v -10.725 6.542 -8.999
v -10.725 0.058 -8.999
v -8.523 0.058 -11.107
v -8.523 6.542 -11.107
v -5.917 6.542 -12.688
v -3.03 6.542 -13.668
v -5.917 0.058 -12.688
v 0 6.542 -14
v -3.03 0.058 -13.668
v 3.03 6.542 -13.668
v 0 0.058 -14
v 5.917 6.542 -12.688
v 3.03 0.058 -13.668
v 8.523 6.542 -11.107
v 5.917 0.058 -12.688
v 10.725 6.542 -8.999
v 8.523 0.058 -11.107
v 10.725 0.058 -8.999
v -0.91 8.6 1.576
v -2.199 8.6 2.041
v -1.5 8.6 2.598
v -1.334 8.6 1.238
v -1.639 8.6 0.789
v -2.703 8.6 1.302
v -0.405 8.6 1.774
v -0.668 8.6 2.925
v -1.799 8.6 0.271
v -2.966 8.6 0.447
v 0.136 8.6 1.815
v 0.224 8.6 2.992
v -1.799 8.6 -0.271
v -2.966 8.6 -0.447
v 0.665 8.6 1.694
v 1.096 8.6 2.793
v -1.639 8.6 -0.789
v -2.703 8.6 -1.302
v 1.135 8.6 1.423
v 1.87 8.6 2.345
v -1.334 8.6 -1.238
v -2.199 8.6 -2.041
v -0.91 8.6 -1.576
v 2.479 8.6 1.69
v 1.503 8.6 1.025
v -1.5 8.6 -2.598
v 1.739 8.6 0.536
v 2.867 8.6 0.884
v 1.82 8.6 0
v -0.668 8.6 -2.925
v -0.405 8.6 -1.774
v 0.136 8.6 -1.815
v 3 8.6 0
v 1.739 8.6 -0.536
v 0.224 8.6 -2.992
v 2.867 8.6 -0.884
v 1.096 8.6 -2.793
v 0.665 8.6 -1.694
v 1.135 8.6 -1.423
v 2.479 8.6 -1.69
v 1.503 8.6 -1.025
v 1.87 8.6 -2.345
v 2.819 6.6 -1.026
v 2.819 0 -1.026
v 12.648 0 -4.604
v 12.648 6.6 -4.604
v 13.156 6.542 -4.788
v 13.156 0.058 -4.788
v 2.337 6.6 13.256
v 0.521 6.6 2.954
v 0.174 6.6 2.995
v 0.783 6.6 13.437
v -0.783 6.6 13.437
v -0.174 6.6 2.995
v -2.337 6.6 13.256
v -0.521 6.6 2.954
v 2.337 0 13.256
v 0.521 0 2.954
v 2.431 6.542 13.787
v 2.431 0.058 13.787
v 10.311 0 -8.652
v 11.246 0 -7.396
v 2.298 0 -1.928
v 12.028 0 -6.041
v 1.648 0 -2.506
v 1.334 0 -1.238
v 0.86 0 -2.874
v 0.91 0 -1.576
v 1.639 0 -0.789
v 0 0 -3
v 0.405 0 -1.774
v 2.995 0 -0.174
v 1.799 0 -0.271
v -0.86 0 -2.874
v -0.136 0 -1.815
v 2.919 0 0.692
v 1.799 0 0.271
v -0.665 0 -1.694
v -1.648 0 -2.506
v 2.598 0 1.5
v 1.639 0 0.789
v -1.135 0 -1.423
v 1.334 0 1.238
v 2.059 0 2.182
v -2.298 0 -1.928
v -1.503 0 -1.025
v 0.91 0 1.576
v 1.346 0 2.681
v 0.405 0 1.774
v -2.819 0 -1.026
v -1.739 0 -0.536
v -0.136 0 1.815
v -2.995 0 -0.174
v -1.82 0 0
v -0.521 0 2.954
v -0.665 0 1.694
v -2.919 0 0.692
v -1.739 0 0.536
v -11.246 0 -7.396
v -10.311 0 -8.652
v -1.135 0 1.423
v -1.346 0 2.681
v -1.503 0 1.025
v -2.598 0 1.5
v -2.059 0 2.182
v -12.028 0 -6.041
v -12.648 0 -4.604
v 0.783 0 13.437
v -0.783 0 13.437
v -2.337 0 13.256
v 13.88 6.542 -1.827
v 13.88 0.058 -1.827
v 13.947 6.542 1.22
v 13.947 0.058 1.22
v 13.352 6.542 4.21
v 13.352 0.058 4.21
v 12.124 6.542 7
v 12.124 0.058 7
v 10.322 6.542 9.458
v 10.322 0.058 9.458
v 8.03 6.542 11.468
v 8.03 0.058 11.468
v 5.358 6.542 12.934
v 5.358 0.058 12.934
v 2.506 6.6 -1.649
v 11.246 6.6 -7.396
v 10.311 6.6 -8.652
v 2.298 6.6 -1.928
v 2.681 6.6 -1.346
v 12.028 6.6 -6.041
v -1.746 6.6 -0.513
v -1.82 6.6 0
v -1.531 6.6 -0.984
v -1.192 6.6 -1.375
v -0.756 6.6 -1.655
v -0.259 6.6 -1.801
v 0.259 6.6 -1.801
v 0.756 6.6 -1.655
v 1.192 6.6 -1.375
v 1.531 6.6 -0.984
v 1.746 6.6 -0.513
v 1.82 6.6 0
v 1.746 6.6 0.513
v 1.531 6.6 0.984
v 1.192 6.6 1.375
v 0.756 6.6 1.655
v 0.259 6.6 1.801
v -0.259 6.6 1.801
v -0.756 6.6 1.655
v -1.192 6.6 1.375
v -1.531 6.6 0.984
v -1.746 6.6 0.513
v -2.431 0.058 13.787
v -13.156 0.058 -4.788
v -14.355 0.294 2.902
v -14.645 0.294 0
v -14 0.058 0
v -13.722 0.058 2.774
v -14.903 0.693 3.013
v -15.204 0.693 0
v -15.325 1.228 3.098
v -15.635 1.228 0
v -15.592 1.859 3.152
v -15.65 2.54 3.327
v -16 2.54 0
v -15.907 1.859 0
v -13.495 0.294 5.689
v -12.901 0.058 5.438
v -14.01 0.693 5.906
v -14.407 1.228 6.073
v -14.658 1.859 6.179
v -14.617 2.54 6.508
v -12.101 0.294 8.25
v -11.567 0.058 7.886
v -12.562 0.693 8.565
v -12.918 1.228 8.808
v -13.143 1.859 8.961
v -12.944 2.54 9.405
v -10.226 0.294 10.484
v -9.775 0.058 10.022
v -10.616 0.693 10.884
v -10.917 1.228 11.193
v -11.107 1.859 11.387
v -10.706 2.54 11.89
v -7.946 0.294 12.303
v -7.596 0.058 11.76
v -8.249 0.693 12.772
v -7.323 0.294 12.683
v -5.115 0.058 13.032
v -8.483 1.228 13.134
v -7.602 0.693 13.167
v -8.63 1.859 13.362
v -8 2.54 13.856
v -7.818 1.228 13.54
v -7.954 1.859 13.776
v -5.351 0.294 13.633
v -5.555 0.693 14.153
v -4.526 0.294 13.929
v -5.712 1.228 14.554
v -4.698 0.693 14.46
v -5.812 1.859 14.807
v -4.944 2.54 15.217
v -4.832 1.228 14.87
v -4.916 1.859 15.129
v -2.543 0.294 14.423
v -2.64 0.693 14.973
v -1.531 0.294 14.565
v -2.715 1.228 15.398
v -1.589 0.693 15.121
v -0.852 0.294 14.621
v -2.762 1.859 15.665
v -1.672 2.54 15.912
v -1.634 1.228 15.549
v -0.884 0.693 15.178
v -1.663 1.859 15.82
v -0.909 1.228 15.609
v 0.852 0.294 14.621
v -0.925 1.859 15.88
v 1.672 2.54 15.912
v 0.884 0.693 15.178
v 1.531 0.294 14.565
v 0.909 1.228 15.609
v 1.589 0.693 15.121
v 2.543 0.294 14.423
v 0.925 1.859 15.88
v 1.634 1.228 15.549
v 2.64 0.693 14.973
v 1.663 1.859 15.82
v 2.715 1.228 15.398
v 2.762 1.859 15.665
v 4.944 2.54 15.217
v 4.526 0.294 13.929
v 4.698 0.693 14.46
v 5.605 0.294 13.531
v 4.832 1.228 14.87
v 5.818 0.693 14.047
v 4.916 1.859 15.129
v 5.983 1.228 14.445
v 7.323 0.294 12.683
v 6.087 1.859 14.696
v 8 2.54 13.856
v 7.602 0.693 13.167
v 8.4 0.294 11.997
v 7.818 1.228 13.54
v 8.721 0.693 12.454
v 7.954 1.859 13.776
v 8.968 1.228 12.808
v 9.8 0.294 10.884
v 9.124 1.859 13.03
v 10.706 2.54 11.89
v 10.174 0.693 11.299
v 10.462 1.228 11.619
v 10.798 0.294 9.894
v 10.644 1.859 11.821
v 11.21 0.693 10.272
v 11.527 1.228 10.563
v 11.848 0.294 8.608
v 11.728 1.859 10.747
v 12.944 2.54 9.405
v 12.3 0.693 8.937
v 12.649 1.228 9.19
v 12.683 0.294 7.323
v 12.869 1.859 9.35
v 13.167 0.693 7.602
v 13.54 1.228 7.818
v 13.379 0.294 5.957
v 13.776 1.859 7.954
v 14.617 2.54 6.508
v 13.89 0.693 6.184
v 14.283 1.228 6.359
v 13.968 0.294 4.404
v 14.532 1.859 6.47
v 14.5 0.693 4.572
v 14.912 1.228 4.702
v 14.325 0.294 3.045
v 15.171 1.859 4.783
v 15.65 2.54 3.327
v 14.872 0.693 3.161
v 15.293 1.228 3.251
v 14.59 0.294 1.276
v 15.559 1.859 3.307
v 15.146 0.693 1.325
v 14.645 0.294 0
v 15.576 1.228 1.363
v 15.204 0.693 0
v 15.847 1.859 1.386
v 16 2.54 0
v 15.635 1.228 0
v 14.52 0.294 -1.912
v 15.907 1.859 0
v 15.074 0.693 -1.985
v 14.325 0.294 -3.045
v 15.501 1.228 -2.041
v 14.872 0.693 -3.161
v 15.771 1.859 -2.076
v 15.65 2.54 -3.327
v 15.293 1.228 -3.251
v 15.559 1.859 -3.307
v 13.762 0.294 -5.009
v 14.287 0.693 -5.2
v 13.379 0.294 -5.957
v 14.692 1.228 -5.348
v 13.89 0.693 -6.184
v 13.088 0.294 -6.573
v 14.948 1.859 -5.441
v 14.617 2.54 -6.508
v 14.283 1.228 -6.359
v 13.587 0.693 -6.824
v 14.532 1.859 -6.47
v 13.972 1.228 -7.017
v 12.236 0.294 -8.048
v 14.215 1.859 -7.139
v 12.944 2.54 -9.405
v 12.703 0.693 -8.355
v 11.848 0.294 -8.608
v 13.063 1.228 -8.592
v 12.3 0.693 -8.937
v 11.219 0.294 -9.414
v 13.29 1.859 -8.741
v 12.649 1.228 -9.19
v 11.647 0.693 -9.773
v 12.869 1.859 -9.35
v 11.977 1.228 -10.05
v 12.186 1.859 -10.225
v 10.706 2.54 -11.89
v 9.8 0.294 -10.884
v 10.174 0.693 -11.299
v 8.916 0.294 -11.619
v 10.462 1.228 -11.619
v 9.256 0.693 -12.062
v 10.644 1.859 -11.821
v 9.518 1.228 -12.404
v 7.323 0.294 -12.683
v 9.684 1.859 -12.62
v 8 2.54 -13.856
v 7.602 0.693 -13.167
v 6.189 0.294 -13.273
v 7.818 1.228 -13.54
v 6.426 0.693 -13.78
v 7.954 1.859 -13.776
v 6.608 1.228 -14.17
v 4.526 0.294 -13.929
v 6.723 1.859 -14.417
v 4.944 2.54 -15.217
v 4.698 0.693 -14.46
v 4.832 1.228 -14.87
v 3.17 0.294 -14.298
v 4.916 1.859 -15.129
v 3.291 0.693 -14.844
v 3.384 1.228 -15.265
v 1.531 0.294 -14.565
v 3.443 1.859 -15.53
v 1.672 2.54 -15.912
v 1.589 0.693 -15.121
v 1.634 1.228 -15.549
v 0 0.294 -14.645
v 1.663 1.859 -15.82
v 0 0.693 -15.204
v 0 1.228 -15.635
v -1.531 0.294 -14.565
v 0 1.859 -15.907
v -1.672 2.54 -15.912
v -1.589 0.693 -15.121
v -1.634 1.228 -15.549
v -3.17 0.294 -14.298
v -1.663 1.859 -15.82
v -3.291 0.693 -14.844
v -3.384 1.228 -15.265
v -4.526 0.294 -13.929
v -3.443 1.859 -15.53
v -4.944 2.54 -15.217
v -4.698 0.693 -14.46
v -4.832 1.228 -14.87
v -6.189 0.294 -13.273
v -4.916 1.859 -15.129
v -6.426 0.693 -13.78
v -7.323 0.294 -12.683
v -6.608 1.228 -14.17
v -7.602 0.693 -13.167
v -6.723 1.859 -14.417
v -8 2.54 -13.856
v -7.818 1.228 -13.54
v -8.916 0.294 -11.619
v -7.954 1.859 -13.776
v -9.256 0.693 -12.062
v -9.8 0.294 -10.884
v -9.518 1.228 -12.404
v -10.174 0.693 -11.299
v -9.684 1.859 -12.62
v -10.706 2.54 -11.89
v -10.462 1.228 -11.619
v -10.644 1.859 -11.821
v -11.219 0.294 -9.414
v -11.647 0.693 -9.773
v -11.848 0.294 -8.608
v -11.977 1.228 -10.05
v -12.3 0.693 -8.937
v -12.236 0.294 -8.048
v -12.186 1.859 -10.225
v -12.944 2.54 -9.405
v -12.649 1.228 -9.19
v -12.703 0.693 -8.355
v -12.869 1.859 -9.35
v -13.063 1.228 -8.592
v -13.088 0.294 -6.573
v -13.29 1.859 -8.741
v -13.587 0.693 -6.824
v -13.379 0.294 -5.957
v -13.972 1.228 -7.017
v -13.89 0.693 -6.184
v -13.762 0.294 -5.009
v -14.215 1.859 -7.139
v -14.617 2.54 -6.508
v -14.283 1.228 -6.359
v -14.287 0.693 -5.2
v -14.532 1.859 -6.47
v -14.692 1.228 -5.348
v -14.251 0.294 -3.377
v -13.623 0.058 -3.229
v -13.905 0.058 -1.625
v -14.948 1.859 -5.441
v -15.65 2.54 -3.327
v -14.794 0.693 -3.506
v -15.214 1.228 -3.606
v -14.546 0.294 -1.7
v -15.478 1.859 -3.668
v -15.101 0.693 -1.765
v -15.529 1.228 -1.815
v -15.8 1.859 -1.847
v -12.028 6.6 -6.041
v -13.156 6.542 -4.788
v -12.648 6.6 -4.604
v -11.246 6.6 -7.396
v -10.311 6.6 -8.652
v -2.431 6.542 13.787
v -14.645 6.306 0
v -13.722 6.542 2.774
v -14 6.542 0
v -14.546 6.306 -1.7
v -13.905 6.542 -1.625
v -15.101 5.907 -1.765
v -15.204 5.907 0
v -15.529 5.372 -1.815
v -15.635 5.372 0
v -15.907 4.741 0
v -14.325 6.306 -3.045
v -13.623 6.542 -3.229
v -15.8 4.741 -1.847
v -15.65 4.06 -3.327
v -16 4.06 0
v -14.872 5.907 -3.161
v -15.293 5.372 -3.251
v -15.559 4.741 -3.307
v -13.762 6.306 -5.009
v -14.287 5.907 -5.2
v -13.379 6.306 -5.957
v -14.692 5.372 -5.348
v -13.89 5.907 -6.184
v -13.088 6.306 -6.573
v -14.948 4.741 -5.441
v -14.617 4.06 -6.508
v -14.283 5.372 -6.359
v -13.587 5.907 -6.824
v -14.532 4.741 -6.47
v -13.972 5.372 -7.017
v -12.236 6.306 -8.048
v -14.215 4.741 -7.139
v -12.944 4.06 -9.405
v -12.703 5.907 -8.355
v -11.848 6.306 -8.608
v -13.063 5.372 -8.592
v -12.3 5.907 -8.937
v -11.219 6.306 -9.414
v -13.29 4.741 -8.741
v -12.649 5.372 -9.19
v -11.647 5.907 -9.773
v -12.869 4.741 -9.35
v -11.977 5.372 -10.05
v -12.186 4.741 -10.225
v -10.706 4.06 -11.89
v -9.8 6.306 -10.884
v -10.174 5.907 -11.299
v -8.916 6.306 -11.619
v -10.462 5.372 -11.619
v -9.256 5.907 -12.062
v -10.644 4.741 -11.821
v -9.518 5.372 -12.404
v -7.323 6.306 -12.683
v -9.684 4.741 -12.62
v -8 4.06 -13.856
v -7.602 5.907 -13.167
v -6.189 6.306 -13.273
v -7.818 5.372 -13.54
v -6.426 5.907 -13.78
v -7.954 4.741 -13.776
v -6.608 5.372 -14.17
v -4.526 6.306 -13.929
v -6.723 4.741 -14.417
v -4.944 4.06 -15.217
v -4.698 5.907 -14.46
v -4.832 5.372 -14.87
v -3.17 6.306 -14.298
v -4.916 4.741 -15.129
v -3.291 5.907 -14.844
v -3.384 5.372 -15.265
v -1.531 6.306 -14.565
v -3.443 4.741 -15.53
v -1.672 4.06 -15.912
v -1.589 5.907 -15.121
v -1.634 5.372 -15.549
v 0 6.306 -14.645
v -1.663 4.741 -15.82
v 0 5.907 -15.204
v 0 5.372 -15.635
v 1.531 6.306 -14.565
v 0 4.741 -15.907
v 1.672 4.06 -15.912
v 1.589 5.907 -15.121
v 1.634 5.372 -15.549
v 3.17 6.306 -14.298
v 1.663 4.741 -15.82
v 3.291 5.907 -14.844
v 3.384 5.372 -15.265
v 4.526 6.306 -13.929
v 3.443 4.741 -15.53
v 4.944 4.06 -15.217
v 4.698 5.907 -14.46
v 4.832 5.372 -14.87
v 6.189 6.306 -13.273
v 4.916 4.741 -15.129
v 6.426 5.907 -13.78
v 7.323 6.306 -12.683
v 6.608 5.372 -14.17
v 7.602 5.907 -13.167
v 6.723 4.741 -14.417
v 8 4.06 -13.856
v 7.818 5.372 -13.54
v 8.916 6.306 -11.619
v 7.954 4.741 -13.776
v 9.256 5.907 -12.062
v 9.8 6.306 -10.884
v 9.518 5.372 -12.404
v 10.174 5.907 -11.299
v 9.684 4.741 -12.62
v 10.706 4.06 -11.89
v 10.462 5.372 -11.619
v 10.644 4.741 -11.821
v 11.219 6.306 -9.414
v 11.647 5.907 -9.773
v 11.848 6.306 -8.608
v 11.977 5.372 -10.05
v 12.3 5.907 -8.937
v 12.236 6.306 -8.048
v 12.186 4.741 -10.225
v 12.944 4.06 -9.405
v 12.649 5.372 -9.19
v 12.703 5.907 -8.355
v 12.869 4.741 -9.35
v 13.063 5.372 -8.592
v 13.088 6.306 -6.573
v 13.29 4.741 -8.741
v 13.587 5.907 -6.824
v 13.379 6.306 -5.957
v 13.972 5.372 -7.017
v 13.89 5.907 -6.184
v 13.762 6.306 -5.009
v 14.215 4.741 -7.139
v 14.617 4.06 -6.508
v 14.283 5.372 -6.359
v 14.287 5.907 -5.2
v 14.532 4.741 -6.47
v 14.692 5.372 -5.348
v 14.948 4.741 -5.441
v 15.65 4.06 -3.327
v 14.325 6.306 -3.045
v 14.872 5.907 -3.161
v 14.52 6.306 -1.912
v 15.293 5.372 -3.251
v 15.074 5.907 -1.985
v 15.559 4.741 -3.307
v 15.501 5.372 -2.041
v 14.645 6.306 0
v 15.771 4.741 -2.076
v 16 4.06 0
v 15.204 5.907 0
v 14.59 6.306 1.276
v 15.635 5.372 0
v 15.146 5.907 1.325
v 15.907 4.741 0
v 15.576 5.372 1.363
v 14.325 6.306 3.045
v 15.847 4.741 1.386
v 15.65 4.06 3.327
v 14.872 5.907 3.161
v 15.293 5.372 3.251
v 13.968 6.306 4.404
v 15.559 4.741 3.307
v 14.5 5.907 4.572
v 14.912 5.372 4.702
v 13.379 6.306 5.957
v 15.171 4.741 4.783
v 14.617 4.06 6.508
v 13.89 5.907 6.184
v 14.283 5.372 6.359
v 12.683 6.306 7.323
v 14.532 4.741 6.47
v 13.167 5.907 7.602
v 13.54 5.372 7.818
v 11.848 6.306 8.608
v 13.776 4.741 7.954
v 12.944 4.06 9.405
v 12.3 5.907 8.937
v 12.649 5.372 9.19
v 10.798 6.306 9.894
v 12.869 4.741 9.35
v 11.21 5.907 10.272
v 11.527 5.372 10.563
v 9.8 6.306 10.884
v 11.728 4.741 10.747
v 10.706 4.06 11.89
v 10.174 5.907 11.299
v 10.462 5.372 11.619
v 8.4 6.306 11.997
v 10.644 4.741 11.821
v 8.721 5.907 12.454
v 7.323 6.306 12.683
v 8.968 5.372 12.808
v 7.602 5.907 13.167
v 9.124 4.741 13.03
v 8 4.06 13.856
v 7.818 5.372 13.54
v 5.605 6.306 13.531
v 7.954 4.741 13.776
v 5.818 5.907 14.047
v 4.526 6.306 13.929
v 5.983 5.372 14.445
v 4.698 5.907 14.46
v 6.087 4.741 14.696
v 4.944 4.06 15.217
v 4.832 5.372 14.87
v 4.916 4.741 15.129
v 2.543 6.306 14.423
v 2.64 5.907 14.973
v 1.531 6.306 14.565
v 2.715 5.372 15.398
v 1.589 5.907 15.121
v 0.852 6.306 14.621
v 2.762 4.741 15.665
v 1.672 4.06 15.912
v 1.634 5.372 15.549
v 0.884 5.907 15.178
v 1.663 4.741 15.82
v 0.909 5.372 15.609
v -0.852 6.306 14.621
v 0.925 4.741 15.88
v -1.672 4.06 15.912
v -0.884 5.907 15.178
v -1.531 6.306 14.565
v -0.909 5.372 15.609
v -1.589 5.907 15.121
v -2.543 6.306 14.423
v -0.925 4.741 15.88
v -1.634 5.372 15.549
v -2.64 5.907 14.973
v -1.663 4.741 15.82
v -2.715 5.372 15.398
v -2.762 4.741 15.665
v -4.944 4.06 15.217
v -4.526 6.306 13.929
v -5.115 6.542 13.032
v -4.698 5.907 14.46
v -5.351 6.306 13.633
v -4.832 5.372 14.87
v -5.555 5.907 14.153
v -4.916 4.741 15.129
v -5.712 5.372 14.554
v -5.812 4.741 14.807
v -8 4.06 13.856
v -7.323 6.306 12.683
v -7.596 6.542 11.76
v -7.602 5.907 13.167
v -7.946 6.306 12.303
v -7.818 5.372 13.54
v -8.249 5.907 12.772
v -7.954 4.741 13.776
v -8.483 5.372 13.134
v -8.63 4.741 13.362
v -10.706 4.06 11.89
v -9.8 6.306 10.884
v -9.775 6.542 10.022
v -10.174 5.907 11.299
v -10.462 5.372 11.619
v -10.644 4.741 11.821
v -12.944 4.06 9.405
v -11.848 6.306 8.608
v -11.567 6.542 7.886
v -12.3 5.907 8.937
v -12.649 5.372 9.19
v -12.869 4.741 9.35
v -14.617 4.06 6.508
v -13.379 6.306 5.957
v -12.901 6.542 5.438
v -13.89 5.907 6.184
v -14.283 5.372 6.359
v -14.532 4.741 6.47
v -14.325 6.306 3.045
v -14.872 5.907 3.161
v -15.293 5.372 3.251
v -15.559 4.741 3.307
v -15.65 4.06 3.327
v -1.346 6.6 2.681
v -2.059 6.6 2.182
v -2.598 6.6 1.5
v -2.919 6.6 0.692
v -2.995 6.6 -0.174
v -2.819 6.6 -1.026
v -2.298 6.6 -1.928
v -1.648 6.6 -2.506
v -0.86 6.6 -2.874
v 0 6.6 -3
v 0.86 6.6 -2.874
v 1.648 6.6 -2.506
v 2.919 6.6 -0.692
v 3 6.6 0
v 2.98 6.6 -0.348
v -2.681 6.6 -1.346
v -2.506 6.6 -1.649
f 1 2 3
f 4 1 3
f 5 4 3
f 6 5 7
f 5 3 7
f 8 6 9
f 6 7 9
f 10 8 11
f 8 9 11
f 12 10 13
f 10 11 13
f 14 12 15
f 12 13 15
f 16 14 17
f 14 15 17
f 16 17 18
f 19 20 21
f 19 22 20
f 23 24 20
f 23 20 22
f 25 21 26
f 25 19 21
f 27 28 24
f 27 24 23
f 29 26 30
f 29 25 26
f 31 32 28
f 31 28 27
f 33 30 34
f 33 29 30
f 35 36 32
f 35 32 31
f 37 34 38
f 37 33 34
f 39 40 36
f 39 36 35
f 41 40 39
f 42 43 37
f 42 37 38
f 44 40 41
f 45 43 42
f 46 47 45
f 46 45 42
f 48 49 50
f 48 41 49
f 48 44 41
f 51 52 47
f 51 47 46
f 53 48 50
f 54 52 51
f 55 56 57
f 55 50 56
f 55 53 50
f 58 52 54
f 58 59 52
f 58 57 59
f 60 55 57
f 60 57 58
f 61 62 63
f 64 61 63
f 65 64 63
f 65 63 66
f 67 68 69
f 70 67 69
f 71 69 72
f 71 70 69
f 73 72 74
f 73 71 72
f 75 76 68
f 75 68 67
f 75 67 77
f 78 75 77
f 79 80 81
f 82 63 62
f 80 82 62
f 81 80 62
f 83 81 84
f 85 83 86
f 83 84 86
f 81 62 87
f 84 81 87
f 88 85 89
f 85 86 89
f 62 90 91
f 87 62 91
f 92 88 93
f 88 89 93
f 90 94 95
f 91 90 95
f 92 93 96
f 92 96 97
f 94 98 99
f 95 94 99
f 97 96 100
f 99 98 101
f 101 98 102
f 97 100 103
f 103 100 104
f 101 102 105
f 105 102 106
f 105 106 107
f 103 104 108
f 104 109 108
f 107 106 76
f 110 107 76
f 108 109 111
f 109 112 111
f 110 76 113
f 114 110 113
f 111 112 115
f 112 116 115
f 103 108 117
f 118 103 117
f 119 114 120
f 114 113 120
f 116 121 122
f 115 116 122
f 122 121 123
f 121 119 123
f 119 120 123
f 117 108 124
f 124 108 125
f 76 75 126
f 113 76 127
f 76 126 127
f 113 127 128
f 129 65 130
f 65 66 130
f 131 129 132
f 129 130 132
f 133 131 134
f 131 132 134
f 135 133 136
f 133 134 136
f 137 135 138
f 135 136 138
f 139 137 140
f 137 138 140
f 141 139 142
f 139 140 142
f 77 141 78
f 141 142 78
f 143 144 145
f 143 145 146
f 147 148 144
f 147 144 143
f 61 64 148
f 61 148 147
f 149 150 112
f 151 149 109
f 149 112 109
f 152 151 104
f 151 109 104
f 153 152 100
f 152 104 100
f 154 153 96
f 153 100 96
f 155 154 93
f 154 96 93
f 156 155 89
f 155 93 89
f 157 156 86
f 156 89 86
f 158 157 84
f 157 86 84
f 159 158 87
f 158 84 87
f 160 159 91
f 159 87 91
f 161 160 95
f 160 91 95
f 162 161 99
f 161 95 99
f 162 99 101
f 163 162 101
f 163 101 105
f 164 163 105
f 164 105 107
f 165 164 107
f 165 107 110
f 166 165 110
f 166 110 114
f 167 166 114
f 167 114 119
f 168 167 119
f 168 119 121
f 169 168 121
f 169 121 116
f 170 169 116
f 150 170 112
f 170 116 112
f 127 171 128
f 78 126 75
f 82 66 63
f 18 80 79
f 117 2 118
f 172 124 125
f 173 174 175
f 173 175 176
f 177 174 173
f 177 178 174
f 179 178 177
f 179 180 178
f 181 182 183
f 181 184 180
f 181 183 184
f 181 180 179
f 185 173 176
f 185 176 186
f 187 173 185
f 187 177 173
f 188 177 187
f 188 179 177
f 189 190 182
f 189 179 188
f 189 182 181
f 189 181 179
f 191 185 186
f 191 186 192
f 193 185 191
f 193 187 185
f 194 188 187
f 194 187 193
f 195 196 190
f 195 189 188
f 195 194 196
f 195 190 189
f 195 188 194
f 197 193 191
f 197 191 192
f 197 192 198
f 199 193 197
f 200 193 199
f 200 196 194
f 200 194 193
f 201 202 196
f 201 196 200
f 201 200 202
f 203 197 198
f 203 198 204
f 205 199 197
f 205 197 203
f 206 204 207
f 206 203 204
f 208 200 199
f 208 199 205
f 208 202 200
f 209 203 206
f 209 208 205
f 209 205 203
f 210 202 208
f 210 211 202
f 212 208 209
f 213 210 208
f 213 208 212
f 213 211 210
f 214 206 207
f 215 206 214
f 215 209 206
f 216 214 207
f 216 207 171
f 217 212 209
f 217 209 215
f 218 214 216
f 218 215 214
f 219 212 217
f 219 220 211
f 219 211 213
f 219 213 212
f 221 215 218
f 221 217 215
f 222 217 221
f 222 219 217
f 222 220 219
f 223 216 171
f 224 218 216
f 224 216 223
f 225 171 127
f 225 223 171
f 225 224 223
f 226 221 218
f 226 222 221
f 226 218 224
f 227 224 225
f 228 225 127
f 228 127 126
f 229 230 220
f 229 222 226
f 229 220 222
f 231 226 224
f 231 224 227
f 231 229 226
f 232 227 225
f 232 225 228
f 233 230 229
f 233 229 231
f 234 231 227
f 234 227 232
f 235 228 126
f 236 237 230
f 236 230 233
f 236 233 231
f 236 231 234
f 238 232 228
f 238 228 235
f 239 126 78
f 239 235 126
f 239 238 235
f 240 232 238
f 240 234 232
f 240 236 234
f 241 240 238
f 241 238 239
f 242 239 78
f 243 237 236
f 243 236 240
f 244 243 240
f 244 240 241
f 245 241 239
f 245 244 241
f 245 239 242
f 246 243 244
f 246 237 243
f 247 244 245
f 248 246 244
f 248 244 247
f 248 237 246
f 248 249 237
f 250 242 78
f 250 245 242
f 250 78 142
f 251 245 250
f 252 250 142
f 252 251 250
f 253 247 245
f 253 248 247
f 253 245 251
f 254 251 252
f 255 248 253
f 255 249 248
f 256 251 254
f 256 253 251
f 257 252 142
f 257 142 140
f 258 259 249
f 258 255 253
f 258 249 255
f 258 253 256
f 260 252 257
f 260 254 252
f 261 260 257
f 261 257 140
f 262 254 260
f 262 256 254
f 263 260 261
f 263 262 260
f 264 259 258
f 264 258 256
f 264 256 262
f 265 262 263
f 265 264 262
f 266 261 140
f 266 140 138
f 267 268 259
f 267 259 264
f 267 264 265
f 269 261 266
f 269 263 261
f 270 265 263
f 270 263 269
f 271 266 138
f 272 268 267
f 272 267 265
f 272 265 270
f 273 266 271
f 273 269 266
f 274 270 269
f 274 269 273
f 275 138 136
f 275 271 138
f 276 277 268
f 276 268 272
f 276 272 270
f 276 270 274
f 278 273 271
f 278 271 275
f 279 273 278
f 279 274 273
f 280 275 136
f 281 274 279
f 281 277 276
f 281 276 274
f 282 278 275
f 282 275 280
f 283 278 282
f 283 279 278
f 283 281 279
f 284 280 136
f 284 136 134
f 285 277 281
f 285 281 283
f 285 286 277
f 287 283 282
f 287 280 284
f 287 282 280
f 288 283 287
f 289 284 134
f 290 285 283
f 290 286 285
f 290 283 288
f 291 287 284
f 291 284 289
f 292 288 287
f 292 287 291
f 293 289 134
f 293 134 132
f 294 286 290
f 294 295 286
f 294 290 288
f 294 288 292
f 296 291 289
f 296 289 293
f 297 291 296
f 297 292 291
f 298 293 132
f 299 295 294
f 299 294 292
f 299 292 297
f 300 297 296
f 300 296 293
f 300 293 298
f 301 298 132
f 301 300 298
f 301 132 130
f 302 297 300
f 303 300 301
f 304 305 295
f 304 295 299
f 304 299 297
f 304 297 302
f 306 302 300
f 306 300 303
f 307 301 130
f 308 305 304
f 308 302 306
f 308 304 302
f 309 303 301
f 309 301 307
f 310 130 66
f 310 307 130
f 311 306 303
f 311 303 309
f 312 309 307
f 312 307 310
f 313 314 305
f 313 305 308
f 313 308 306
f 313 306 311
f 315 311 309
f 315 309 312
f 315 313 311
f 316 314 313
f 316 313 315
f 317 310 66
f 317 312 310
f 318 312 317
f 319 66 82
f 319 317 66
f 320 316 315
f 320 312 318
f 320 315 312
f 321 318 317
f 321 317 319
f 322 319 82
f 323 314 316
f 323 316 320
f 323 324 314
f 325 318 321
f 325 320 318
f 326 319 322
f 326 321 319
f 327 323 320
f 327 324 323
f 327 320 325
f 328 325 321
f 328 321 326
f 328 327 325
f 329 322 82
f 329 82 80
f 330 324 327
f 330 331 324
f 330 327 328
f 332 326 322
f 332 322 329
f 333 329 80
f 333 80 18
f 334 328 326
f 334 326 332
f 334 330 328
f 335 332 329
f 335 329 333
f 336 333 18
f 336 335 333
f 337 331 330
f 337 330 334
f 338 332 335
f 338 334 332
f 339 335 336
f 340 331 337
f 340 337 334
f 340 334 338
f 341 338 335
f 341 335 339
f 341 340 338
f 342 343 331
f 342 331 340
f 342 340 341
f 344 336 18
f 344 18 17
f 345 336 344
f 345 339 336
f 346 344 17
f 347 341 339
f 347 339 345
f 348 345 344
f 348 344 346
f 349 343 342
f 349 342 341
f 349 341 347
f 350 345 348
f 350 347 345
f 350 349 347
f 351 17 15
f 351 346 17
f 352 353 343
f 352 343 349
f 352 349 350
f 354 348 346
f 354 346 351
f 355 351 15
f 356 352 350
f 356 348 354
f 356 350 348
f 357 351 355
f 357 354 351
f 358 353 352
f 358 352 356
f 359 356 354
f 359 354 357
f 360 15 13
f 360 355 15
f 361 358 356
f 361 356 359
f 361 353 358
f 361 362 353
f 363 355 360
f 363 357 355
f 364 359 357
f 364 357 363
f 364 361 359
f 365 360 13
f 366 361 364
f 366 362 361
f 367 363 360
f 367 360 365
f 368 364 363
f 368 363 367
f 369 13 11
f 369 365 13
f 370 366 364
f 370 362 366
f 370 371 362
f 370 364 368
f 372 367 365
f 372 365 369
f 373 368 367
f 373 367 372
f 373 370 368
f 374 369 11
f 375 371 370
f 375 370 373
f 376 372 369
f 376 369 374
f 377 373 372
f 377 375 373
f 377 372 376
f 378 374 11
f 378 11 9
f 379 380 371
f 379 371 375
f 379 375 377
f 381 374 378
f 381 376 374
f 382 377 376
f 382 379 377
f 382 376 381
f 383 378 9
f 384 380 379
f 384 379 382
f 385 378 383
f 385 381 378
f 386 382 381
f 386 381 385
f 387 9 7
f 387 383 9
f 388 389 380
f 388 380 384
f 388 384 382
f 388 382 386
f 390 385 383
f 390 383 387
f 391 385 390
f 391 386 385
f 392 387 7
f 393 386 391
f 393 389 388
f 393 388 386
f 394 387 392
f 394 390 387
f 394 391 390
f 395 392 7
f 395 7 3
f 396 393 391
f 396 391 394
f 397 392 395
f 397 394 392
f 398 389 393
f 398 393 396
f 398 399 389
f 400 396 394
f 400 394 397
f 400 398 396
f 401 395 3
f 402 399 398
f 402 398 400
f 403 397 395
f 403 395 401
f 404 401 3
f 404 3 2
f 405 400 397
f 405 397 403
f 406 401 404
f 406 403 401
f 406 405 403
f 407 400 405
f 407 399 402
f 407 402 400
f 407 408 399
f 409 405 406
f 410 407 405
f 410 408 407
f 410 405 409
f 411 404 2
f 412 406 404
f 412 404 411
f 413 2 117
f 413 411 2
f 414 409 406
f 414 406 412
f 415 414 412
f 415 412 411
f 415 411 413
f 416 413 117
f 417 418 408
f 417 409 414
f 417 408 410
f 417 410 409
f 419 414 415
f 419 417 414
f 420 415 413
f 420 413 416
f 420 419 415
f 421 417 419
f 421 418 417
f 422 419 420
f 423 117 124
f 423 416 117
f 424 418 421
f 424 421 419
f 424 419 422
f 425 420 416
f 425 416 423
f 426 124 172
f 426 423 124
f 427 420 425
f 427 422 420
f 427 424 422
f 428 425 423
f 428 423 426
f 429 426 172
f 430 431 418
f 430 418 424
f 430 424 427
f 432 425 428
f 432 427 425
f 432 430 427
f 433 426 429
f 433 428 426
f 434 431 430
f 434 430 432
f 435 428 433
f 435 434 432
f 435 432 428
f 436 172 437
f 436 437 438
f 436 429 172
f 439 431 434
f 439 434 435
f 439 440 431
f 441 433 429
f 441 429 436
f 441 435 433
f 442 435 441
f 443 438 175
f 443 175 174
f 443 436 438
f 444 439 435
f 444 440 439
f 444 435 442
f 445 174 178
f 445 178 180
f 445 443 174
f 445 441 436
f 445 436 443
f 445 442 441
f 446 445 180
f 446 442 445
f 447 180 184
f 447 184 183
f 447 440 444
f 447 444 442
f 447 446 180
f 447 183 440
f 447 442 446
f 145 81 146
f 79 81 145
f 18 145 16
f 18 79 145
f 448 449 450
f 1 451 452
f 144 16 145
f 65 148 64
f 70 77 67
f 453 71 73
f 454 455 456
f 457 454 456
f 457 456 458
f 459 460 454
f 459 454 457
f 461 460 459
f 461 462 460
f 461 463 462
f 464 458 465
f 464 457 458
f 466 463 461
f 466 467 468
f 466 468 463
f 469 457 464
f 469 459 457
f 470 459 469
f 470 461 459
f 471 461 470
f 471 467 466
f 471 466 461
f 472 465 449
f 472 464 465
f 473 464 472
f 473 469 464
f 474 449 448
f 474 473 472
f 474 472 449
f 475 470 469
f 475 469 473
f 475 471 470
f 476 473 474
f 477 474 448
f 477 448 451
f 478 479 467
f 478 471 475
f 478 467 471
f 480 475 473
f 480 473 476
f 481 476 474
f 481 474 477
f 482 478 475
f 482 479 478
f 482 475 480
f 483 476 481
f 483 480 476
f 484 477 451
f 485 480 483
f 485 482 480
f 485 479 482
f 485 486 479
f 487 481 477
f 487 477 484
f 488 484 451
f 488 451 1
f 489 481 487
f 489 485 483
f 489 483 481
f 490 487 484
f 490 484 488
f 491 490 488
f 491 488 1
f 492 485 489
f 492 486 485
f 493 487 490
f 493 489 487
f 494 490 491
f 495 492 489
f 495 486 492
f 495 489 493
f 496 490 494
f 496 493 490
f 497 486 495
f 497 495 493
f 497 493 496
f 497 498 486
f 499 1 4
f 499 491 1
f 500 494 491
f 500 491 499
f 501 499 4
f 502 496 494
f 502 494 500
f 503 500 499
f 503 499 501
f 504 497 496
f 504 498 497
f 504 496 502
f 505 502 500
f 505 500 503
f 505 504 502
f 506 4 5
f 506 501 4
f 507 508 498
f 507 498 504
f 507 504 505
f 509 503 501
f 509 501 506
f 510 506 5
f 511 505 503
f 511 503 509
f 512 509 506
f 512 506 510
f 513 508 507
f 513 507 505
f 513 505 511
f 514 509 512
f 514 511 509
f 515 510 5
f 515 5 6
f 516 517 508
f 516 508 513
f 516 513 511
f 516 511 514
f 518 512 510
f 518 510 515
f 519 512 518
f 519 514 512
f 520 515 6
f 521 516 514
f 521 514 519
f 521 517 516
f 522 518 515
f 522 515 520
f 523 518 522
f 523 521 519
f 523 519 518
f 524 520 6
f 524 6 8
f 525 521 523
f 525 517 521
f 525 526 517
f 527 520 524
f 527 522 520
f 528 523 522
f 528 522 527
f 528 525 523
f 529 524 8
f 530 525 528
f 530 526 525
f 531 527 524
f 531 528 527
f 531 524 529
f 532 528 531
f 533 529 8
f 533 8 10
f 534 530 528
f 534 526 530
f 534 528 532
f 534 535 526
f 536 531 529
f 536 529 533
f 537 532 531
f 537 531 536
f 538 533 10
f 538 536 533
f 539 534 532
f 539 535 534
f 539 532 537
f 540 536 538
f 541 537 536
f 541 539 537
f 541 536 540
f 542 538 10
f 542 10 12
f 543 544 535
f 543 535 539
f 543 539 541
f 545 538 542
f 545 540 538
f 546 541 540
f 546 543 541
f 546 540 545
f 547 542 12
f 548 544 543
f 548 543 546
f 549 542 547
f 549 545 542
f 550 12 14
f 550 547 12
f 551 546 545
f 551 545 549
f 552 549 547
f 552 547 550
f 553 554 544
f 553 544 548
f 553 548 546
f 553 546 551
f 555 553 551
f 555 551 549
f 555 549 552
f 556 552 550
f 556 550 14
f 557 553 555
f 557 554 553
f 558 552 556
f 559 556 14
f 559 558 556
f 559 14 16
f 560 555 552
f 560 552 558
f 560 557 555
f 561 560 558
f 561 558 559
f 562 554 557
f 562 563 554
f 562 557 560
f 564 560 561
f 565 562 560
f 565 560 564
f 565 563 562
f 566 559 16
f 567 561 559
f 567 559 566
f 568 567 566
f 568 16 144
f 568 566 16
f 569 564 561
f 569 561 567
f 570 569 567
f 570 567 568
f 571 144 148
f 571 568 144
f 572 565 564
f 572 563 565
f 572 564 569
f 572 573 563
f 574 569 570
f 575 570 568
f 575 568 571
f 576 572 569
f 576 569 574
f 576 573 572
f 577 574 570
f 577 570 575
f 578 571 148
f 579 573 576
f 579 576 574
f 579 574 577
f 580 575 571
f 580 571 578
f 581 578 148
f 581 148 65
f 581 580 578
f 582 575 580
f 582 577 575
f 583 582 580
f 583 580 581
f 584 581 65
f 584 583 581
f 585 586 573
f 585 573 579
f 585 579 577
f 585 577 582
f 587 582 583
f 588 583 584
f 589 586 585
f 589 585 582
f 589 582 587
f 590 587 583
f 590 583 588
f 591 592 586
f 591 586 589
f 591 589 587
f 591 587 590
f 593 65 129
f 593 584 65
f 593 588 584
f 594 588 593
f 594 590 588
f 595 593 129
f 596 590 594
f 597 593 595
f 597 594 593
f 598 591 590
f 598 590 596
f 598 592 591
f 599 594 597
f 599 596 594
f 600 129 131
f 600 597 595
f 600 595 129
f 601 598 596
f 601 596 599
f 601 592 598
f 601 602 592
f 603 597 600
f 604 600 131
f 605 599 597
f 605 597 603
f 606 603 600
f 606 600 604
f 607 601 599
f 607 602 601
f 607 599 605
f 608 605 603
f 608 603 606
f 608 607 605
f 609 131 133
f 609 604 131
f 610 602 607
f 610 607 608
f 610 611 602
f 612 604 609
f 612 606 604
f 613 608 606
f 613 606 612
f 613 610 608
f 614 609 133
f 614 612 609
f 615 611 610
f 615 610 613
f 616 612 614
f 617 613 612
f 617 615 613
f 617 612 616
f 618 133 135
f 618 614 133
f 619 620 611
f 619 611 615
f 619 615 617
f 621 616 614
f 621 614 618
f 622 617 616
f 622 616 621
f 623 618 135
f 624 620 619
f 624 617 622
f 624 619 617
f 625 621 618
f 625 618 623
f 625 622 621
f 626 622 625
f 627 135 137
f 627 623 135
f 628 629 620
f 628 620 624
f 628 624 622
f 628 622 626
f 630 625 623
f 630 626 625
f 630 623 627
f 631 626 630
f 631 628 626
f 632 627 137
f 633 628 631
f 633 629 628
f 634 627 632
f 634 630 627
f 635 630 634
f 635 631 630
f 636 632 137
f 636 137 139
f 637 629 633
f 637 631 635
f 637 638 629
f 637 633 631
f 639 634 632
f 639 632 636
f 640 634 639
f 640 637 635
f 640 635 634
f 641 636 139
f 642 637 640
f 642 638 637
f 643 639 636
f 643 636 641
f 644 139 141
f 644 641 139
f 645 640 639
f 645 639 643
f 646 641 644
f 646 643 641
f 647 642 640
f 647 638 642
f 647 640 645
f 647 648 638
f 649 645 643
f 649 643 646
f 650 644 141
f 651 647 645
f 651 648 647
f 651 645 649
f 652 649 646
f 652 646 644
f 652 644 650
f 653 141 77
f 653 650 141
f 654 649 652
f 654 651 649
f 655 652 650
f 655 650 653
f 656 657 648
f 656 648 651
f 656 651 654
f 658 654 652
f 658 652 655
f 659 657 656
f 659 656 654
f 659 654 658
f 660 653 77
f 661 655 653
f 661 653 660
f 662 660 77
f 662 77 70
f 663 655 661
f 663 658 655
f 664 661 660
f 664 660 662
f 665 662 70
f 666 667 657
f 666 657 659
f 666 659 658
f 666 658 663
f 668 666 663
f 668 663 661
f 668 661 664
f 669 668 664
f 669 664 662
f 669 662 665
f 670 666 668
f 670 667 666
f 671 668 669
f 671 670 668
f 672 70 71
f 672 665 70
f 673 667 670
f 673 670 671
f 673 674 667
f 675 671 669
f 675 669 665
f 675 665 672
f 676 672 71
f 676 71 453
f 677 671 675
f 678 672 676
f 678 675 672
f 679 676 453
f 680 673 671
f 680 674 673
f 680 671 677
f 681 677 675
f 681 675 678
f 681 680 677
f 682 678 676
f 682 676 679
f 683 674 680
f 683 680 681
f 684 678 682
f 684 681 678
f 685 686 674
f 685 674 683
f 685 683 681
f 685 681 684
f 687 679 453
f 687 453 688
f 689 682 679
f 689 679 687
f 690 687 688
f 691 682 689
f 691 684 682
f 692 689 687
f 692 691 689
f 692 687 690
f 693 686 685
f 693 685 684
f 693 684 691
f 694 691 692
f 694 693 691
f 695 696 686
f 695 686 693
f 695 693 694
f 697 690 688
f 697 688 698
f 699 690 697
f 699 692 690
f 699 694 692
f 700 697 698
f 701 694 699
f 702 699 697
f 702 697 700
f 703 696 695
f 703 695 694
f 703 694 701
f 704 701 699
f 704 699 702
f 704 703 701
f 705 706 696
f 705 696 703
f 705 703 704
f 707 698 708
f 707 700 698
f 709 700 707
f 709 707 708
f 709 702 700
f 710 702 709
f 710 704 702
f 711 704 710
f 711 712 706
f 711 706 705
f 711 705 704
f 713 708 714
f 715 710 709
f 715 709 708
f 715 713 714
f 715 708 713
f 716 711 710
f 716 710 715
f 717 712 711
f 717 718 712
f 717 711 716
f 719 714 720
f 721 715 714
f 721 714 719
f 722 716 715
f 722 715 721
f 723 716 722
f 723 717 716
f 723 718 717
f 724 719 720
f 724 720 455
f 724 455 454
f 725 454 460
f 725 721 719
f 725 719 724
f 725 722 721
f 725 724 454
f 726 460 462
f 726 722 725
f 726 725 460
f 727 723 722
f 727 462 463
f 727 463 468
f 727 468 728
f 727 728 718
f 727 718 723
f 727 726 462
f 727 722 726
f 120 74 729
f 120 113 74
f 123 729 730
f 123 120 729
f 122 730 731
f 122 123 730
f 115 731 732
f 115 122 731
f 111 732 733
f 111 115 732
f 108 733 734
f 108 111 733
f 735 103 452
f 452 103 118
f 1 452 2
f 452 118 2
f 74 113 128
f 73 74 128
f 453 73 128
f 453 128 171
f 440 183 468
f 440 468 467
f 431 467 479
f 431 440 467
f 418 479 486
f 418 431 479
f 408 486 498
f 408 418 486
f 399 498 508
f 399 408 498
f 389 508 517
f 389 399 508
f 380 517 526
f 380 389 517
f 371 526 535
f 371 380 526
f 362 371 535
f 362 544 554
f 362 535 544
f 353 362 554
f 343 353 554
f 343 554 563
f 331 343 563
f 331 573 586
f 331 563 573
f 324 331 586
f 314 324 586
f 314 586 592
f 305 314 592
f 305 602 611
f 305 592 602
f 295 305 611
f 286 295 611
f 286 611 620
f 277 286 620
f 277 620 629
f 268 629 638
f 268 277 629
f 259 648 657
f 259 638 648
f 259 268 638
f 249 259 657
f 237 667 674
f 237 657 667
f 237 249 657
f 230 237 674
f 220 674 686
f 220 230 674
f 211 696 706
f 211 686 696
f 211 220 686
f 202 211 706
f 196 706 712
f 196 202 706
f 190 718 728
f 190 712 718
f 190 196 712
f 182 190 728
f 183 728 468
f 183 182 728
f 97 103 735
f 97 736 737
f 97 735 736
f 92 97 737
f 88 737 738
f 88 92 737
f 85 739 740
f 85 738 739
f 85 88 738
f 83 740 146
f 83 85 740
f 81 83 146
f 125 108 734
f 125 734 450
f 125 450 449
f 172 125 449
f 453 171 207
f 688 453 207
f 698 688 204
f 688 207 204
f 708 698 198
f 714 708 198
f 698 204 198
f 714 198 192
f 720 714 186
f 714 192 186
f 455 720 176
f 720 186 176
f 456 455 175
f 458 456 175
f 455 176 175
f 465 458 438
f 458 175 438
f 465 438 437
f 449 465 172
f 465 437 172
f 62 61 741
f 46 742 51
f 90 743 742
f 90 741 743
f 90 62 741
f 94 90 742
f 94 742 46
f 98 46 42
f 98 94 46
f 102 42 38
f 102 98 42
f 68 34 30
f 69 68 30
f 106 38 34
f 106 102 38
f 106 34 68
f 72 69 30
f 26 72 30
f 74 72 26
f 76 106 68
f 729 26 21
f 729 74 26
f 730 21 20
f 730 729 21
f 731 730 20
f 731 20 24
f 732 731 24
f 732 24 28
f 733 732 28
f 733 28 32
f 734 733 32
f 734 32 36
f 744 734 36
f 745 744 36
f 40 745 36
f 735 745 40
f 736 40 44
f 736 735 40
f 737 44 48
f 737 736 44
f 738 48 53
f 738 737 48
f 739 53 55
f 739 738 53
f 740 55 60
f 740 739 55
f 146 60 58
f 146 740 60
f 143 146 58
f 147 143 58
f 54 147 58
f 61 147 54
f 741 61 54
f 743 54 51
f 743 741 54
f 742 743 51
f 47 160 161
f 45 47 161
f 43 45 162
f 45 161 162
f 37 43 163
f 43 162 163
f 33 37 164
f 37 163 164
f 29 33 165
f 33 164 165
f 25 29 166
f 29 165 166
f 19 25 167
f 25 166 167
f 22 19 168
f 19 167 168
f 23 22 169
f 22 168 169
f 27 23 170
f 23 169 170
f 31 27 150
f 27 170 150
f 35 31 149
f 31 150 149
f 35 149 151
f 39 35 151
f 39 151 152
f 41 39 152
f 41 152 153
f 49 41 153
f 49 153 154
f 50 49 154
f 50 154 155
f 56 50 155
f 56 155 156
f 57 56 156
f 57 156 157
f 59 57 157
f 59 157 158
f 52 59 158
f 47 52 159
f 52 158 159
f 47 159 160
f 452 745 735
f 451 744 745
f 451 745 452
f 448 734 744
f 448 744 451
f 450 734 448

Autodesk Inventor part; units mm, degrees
ref_plane "YZ Plane" through (0, 0, 0) normal (1, 0, 0) x (0, 1, 0)
ref_plane "XZ Plane" through (0, 0, 0) normal (0, 1, 0) x (-1, 0, 0)
ref_plane "XY Plane" through (0, 0, 0) normal (0, 0, 1) x (1, 0, 0)
sketch "Sketch2" plane through (0, 0, 0) normal (0, 1, 0) x (-1, 0, 0)
  circle A0 centre (0, 0) radius 14
  line L0 (0, 0) -> (0, 14) construction
  line L1 (0, 0) -> (12.1244, -7) construction
  line L2 (0, 0) -> (-12.1244, -7) construction
  circle A1 centre (0, 0) radius 3
  line L3 (2.8191, -1.0261) -> (13.1557, -4.7883)
  line L4 (2.2981, -1.9284) -> (10.7246, -8.999)
  line L5 (0.5209, 2.9544) -> (2.4311, 13.7873)
  line L6 (-0.5209, 2.9544) -> (-2.4311, 13.7873)
  line L7 (-2.8191, -1.0261) -> (-13.1557, -4.7883)
  line L8 (-2.2981, -1.9284) -> (-10.7246, -8.999)
  circle A2 centre (0, 0) radius 16
  circle A3 centre (0, 0) radius 1.8196
  dimension "d10" = 120
  dimension "d11" = 120
  dimension "d18" = 6
  dimension "d19" = 10
  dimension "d20" = 20
  dimension "d21" = 10
  dimension "d22" = 20
  dimension "d23" = 10
  dimension "d24" = 20
  dimension "d26" = 3.6391
  dimension "d29" = 32
  dimension "d30" = 2
extrude "Extrusion1" add sketch "Sketch2" along normal blind 6.6 contours L5 A1 L6 A0 | A0 L4 A1 L3 | A1 | L7 A1 L8 A0 | A2
sketch "Sketch3" plane through (0, 6.6, 0) normal (0, 1, 0) x (1, 0, 0)
  circle A0 centre (0, 0) radius 3
  circle A1 centre (0, 0) radius 1.8196 projected
  circle A2 centre (0, 0) radius 1.8196
extrude "Extrusion2" add sketch "Sketch3" along normal blind 2
fillet "Fillet4" radius 2.54 2 edges at (16, 6.6, 0) (16, 0, 0)
properties part number "wheel"
